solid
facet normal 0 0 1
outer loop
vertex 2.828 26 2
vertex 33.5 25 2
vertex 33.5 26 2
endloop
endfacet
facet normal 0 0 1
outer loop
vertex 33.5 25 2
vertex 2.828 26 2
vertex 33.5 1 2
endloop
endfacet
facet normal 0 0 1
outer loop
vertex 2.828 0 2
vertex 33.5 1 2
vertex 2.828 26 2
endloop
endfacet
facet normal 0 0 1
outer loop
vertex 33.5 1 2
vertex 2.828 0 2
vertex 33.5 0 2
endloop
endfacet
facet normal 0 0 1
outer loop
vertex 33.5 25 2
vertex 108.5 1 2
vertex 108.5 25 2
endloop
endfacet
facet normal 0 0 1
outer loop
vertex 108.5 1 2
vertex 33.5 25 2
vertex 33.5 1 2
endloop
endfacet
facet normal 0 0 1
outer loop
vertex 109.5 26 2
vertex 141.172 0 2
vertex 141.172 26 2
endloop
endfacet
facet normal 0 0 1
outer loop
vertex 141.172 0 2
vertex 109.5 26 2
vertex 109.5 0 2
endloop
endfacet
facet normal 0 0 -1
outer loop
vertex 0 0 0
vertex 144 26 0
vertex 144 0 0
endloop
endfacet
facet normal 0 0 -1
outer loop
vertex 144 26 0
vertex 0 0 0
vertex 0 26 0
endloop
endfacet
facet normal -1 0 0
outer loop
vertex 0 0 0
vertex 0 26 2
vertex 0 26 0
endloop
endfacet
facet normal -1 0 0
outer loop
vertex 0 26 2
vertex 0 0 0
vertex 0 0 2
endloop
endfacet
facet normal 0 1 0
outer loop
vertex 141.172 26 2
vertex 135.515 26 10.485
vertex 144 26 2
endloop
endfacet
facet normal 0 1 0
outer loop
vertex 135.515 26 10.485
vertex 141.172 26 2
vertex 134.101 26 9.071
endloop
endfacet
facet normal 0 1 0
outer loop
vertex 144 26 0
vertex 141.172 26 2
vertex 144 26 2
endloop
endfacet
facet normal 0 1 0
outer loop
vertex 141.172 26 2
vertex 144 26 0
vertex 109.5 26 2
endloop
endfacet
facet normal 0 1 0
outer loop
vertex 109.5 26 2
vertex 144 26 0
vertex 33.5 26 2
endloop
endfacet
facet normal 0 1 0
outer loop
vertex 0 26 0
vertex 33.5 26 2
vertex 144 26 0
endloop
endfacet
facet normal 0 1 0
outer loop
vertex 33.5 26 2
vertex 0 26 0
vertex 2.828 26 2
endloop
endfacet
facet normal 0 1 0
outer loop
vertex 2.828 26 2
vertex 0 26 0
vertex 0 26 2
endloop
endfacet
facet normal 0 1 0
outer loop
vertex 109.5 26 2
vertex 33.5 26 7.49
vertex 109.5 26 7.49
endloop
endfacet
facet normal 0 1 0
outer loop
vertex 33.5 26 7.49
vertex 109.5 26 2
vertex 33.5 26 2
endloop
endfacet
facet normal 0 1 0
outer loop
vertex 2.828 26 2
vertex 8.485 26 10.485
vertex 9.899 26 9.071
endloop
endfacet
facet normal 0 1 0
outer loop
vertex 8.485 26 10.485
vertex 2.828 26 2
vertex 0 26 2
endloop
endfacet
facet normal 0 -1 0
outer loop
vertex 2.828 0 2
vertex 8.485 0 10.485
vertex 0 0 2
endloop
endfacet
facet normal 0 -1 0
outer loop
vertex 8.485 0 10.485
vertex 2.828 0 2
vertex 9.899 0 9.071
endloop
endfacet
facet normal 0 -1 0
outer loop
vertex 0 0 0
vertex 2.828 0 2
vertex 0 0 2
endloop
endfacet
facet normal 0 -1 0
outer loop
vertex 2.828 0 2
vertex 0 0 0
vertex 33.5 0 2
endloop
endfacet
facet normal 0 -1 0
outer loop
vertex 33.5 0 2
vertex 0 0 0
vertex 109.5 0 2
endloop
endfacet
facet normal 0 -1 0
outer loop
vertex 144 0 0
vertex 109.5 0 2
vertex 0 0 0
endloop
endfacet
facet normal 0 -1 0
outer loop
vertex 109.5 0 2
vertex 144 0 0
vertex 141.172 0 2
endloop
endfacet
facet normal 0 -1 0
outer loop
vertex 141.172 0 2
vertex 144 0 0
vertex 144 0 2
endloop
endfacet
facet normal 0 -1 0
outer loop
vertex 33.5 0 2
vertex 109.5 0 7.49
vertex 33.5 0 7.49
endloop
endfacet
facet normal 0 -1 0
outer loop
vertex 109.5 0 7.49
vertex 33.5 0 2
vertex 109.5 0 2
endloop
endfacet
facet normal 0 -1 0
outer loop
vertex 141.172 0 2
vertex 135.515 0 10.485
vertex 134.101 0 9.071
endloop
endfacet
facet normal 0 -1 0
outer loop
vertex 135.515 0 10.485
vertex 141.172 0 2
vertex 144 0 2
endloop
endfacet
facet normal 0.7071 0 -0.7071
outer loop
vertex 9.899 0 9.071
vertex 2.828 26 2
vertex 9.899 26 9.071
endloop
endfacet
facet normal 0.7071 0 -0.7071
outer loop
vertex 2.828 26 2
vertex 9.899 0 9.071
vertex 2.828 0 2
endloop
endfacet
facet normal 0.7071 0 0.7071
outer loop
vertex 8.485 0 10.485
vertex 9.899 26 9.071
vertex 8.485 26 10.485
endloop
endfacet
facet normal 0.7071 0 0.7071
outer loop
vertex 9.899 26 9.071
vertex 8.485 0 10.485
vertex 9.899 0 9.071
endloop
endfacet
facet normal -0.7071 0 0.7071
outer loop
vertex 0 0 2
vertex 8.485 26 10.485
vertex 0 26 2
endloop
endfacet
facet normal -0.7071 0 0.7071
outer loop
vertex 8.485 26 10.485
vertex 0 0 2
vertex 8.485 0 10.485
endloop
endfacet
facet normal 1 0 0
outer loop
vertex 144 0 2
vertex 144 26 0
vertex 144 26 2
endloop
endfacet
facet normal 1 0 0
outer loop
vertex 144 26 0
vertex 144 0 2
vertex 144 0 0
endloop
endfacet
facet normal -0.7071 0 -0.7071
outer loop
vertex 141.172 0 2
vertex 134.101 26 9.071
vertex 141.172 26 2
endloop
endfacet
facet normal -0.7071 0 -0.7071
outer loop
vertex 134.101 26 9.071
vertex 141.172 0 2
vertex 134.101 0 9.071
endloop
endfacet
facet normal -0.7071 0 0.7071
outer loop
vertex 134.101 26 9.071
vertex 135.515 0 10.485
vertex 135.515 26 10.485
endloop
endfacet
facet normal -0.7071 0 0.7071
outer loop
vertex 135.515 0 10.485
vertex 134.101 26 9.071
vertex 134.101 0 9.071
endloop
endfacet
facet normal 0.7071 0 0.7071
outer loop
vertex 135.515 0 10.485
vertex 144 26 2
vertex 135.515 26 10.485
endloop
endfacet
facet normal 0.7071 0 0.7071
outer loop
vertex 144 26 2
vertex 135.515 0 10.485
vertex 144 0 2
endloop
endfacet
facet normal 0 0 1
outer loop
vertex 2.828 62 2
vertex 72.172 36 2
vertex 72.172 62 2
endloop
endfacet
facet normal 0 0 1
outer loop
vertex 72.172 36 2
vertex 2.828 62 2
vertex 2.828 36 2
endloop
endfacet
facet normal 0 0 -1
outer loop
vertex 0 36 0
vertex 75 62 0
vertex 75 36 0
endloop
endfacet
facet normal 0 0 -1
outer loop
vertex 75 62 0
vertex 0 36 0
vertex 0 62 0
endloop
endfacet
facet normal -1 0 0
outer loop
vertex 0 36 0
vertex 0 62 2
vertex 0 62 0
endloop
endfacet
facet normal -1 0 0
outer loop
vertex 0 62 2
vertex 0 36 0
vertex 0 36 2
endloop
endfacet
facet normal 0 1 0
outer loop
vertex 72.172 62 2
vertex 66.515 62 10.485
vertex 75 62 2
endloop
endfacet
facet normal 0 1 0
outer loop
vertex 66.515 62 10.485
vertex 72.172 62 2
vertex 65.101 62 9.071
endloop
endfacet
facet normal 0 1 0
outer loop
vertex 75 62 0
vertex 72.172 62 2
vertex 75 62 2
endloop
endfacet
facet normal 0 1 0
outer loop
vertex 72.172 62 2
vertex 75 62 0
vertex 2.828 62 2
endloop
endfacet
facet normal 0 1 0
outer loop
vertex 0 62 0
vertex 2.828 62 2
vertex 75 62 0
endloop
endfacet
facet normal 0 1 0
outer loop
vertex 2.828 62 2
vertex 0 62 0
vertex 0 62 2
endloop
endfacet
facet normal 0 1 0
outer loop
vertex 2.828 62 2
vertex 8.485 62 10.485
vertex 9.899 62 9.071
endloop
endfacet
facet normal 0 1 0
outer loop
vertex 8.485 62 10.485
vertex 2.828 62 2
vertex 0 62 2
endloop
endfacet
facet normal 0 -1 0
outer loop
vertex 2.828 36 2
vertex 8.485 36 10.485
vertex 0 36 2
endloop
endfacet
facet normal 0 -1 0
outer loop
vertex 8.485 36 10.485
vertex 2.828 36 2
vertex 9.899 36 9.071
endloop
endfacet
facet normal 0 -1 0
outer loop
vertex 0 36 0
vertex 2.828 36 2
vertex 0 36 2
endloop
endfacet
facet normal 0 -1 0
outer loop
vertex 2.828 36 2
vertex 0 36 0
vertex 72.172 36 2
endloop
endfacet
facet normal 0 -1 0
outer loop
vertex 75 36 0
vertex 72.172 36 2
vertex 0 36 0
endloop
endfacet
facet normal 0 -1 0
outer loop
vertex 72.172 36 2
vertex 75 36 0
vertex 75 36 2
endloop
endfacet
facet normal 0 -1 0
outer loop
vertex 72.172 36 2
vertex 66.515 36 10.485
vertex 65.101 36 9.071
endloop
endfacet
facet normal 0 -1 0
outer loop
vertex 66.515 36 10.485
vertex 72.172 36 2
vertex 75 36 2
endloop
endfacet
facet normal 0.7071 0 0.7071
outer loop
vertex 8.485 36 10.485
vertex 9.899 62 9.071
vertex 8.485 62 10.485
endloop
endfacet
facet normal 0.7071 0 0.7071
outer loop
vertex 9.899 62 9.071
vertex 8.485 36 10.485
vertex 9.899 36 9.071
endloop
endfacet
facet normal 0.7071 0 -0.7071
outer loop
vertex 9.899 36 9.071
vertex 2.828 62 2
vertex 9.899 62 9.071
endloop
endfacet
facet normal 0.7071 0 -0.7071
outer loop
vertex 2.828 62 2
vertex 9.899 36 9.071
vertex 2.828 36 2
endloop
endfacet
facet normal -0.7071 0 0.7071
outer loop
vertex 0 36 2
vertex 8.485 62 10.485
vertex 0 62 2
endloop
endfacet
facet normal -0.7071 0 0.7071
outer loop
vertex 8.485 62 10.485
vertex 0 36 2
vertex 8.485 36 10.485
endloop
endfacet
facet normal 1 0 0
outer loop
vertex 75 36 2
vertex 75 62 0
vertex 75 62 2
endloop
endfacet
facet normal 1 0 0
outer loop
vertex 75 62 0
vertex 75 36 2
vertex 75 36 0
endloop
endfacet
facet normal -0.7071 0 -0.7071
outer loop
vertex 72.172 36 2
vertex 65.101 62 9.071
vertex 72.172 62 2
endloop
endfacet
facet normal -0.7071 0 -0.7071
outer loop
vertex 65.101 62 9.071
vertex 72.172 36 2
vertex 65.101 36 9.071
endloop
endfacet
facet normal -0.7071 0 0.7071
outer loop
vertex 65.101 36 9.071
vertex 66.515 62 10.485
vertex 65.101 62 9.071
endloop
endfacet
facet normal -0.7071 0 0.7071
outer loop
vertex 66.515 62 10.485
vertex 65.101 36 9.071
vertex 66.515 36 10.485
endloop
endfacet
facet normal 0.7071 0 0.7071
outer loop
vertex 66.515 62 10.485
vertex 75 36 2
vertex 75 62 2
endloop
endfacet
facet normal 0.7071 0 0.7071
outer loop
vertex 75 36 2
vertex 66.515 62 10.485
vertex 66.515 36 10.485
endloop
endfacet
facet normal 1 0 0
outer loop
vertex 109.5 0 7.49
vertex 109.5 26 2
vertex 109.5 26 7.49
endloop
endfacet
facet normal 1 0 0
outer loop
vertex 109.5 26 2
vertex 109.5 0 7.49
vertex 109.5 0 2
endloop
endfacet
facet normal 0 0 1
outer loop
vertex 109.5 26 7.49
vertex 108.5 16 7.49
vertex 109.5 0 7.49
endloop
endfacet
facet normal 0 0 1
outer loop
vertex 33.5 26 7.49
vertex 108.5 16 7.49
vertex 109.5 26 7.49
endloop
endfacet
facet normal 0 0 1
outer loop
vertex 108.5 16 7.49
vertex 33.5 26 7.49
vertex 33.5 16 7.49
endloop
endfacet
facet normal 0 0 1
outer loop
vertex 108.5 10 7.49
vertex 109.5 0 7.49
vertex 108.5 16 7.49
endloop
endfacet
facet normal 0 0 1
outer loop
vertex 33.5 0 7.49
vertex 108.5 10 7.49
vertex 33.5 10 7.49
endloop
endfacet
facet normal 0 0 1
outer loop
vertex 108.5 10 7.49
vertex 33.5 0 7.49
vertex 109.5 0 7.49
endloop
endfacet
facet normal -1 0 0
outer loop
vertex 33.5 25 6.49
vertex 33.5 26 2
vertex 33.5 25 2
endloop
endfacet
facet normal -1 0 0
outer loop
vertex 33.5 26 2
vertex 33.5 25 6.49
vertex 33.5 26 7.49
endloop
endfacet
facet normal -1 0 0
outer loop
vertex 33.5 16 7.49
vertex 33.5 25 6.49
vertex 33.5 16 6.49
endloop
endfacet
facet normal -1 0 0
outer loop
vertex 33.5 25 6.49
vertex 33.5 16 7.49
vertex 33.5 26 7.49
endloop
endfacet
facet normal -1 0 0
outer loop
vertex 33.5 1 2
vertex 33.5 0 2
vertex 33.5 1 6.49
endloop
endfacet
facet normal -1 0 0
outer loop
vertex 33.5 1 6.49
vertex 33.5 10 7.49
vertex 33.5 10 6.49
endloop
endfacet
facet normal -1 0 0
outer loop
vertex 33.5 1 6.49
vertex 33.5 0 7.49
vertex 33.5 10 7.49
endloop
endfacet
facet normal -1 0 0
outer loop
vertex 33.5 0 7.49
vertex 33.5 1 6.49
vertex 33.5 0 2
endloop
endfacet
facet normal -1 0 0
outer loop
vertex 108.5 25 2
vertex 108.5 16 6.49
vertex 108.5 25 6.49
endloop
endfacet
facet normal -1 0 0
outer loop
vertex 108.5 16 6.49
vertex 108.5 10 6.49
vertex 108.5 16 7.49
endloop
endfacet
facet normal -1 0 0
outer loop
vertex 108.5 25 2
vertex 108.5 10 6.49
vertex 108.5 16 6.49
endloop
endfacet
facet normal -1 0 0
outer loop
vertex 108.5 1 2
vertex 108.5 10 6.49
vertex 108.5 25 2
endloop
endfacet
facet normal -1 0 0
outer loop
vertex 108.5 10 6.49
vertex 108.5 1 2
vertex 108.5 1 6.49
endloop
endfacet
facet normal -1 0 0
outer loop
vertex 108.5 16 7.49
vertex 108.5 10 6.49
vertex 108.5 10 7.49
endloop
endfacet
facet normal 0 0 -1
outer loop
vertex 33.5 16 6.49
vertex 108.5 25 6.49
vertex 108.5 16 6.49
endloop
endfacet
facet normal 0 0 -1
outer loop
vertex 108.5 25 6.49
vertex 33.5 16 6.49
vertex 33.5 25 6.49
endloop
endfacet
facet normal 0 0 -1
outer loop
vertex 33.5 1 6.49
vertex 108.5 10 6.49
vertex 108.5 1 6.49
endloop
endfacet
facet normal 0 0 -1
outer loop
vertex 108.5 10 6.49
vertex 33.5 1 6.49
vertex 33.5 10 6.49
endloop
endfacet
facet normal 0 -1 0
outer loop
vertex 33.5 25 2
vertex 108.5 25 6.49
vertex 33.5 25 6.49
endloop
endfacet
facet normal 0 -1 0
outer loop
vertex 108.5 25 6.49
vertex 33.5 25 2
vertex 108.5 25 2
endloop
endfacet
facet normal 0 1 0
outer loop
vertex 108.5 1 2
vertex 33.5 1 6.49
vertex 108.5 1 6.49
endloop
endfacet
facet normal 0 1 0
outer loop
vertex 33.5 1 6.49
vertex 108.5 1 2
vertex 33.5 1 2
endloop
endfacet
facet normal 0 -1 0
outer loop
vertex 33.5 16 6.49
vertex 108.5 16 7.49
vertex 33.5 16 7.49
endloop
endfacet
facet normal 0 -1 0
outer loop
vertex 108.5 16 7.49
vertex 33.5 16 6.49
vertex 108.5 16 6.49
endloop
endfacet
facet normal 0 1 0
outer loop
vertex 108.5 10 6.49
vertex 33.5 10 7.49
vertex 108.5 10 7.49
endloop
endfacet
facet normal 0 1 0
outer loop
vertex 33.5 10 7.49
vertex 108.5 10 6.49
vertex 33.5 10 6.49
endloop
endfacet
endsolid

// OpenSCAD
hook_len = 12;

paper_slot_t      = 1;
paper_slot_iw     = 75;
paper_slot_ih     = 24;
paper_slot_id     = 4.5;
paper_slot_w      = paper_slot_iw+paper_slot_t*2;
paper_slot_hole_w = 6;

main_plate_t    = 2;
main_plate_w    = 144;
main_plate_h    = paper_slot_t + paper_slot_ih + 1;
support_plate_t = main_plate_t;
support_plate_w = paper_slot_iw;
support_plate_h = main_plate_h;


module plate(w,h,t,hook_len){
	plate_half(w/2,h,t,hook_len);
	rotate([0,0,180]) translate([-w,-h,0])
		plate_half(w/2,h,t,hook_len);
}

module plate_half(w,h,t,hook_len){
	cube([w,h,t]);
	translate([0,0,t]) rotate([0,45,0])
		cube([t,h,hook_len]);
}

module paper_slot(iw,ih,id,t,hole_w){
	difference(){
		cube([iw+t,ih+t*2,id+t]);
                translate([0,t,0]) cube([iw,ih,id]);
                translate([0,t+ih/2-hole_w/2,0]) cube([iw,hole_w,100]);
	}
}

plate(main_plate_w,main_plate_h,main_plate_t,hook_len);
translate([0,36,0])plate(support_plate_w,support_plate_h,support_plate_t,hook_len);
translate([main_plate_w/2-paper_slot_w/2,0,main_plate_t-0.01])
	paper_slot(paper_slot_iw,paper_slot_ih,paper_slot_id,paper_slot_t,paper_slot_hole_w);
